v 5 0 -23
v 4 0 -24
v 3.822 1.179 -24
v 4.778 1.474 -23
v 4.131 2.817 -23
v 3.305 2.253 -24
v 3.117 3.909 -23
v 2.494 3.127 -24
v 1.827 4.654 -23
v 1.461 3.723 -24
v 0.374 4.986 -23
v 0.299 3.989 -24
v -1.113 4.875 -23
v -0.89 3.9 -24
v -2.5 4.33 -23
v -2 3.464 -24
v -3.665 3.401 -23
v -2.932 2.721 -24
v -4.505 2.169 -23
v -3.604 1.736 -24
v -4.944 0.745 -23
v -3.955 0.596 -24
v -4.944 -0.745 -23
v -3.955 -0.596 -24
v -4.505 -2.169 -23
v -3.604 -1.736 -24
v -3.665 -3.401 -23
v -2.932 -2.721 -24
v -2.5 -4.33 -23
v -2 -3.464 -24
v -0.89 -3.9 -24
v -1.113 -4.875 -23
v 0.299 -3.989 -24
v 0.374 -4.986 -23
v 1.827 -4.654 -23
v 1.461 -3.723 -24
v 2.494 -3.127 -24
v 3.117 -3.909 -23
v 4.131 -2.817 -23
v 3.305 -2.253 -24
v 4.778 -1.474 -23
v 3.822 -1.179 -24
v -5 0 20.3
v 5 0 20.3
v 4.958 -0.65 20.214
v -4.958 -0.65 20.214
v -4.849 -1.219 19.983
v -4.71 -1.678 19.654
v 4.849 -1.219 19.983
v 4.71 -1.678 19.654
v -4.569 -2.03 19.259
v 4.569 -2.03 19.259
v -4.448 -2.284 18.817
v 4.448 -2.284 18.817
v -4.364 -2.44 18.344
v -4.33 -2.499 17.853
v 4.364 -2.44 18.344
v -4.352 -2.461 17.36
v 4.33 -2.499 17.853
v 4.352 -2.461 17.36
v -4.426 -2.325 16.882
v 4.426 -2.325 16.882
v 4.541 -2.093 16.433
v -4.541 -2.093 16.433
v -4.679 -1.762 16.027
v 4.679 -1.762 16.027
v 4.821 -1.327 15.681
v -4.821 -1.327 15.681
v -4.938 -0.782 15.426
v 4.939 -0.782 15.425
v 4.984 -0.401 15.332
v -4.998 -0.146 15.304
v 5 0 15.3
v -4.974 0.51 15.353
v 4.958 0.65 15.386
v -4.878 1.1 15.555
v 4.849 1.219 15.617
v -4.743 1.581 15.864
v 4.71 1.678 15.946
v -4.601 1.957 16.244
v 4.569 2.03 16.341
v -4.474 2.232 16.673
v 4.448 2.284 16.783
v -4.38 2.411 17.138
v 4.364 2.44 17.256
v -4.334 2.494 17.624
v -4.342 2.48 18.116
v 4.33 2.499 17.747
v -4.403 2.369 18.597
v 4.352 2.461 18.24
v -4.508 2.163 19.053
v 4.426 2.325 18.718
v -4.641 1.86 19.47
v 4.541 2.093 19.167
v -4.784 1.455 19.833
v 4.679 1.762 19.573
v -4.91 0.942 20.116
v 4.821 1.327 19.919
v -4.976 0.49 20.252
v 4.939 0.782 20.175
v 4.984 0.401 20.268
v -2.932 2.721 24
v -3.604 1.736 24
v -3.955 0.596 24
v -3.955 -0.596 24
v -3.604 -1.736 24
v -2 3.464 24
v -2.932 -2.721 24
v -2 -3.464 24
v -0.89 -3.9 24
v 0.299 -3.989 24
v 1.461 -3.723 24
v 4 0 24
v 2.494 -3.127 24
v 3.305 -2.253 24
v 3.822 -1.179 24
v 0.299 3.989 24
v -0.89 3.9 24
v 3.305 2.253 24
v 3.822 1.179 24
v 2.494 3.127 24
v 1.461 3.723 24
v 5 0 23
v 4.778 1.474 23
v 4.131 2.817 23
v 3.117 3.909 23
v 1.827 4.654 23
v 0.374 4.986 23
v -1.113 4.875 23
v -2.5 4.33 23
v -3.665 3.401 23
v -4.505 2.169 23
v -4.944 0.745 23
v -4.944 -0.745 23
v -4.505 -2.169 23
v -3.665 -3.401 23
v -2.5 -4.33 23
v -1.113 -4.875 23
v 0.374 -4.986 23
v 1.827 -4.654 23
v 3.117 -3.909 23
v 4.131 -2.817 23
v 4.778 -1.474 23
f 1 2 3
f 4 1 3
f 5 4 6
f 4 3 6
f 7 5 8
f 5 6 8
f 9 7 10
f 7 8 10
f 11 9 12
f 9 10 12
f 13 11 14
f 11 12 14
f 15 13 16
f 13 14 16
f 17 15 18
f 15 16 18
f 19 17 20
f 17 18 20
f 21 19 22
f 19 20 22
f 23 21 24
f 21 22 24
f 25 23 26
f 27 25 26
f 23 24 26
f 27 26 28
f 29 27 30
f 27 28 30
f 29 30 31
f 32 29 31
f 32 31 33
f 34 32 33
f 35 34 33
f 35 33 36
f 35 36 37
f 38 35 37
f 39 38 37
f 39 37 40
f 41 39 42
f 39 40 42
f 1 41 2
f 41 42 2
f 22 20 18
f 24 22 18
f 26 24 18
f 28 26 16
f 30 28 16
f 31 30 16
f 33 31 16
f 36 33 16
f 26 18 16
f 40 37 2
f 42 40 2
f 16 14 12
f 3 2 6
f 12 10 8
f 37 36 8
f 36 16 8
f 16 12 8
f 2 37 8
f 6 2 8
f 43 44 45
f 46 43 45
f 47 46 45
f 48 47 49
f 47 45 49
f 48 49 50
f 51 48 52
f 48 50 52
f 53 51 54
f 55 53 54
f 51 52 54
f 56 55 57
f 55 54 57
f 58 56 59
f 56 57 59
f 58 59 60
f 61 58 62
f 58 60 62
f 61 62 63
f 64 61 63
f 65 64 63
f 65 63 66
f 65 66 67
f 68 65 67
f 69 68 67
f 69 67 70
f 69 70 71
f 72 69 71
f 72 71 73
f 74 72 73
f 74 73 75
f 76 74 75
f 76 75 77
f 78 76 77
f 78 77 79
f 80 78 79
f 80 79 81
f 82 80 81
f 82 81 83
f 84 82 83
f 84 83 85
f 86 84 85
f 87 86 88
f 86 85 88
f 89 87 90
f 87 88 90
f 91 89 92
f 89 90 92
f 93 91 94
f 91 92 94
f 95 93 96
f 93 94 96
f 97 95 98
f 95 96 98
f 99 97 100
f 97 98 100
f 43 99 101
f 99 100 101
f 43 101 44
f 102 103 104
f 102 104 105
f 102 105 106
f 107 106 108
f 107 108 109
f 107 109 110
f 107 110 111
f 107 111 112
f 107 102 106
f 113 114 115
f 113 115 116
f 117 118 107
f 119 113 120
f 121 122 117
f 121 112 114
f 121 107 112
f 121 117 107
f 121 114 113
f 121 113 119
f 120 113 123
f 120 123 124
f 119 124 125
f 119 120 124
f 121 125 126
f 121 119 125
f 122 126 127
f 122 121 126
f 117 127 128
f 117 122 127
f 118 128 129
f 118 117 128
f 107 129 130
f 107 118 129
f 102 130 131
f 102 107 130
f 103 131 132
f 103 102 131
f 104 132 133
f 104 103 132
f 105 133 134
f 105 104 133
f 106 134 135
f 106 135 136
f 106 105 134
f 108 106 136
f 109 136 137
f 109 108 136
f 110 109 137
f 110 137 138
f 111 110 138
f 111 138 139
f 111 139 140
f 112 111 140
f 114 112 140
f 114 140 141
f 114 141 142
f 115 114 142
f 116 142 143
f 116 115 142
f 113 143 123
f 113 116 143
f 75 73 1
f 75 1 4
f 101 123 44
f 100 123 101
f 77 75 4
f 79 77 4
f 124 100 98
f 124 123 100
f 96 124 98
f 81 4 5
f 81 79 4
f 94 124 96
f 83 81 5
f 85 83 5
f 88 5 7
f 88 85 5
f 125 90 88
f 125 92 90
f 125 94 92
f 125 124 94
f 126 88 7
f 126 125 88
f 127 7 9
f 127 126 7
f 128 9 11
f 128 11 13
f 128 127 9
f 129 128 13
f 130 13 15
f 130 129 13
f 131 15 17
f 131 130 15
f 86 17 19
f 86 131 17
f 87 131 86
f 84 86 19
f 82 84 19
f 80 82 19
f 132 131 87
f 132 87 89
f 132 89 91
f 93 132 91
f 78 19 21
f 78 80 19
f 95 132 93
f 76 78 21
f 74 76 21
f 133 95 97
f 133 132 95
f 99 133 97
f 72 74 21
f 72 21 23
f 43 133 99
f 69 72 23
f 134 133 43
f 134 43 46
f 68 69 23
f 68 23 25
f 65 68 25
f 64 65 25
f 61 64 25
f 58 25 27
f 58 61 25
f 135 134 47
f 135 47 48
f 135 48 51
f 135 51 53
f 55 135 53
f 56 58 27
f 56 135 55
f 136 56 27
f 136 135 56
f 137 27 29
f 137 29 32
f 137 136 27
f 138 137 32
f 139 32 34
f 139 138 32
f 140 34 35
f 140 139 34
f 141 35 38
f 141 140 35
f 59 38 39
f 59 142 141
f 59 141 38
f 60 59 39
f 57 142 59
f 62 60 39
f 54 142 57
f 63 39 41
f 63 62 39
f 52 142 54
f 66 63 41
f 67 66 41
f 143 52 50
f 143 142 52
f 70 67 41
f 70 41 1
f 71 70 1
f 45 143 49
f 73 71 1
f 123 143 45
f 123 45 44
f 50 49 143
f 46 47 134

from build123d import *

# Parameters (mm, degrees)
SKETCH_1_R      = 5
EXTRUDE_1_DEPTH = 24
CHAMFER_1_SIZE  = 1
SKETCH_6_W      = 2.5
SKETCH_6_H      = 5


with BuildPart() as part:
    # ｽｹｯﾁ1 → ﾎﾞｽ - 押し出し1 (new, symmetric)
    with BuildSketch(Plane.XY):
        Circle(SKETCH_1_R)
    extrude(amount=EXTRUDE_1_DEPTH, both=True)

    # 面取り1
    chamfer_1_edges = [part.edges().sort_by_distance(p)[0] for p in [
        (-5, 0, -24),
        (-5, 0, 24),
    ]]
    chamfer(chamfer_1_edges, length=CHAMFER_1_SIZE)

    # ｽｹｯﾁ6 → M6x1.0 ねじ穴用ねじ下穴ﾄﾞﾘﾙ1 (revolve, cut)
    with BuildSketch(Plane(origin=(0, 0, 17.8), x_dir=(0, 0, 1), z_dir=(0, 1, 0))):
        with Locations((1.25, 2.5)):
            Rectangle(SKETCH_6_W, SKETCH_6_H)
    m6x1_0_1 = revolve(axis=Axis((-6.35, 0, 17.8), (1, 0, 0)), mode=Mode.SUBTRACT)

    # ﾐﾗｰ1: M6x1.0 ねじ穴用ねじ下穴ﾄﾞﾘﾙ1 across plane
    add(m6x1_0_1.mirror(Plane(origin=(0, 0, 0), x_dir=(0, 0, 1), z_dir=(1, 0, 0))), mode=Mode.SUBTRACT)


solid = part.part
